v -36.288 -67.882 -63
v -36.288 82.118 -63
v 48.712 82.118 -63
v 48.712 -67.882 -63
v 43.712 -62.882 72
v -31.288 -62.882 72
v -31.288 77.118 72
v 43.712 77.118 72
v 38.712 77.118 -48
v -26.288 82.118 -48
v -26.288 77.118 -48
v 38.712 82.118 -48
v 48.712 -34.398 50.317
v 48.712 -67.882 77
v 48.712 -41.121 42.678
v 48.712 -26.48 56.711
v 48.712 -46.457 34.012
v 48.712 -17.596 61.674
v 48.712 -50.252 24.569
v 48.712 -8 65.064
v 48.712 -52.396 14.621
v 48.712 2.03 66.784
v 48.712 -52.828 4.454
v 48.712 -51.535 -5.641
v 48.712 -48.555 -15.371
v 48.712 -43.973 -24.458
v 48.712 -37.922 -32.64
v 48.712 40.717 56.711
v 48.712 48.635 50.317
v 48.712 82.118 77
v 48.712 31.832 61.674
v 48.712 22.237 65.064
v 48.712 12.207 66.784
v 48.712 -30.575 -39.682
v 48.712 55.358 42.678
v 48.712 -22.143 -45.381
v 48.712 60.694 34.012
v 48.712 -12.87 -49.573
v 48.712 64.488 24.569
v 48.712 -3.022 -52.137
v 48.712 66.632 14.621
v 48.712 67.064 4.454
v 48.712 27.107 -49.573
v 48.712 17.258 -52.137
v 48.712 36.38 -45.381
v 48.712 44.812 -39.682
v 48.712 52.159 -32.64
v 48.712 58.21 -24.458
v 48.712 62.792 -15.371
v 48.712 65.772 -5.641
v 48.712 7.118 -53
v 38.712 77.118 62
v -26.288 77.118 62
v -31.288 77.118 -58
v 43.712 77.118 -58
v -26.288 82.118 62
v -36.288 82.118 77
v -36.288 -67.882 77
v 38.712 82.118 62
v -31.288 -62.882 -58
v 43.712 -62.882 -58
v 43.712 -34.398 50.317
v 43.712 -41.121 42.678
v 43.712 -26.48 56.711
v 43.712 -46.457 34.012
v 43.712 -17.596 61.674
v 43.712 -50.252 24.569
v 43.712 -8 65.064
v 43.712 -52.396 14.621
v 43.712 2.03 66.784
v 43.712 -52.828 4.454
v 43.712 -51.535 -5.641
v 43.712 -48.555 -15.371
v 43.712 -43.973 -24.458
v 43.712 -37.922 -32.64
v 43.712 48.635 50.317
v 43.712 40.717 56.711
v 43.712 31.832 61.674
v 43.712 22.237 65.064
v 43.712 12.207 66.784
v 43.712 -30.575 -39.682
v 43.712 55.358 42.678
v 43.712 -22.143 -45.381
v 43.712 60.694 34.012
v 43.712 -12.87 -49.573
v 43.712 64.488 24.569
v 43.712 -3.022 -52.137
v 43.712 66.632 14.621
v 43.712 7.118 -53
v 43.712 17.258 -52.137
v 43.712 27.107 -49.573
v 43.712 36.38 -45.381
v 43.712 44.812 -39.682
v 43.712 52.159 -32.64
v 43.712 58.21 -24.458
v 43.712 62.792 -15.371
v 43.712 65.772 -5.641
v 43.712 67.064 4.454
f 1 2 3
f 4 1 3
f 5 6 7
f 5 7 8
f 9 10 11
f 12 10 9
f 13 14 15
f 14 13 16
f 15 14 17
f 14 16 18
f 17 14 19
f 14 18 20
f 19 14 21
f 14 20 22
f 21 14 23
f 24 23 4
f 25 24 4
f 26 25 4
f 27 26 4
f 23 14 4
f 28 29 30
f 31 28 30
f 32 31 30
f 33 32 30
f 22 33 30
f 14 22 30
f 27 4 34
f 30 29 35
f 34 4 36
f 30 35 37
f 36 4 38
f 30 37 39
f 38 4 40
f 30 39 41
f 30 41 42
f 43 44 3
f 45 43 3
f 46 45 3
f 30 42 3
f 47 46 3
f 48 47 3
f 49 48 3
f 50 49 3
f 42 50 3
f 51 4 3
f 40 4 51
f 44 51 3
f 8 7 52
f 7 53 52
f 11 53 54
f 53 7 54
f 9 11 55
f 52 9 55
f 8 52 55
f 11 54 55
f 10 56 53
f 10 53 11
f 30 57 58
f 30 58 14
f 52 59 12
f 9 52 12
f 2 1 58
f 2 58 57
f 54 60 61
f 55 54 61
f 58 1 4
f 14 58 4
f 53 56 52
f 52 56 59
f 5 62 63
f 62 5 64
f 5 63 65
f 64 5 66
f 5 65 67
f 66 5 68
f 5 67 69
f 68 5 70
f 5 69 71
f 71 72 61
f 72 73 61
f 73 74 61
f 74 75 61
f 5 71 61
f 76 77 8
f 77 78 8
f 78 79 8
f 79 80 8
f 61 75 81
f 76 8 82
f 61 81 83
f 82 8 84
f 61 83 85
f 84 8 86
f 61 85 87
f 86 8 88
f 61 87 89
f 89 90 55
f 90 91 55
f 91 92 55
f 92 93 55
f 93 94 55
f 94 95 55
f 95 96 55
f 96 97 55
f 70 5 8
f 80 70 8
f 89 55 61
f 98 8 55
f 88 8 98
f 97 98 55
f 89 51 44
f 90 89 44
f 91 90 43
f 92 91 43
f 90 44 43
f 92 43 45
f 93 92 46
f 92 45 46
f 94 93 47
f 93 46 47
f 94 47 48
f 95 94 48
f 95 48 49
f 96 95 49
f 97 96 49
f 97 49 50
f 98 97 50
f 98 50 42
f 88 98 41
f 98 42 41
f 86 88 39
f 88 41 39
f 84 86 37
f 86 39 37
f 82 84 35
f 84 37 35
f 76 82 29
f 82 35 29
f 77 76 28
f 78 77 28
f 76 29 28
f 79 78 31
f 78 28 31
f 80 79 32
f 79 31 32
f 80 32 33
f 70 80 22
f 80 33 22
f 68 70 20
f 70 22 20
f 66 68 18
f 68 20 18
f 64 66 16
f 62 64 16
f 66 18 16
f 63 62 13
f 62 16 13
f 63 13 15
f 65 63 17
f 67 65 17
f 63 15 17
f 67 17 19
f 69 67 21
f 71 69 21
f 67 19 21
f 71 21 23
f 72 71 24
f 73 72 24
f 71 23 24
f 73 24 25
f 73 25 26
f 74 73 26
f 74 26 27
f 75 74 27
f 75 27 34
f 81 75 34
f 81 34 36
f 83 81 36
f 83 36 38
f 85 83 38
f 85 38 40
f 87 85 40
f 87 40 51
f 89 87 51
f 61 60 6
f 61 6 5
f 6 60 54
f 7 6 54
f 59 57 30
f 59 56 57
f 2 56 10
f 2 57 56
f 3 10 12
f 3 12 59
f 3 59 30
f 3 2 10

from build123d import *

# Parameters (mm, degrees)
SKETCH1_W           = 8.5
SKETCH1_H           = 15
BOSS_EXTRUDE1_DEPTH = 14
SHELL3_T            = -0.5
SKETCH2_W           = 14
SKETCH2_H           = 15
SKETCH2_R           = 6
BOSS_EXTRUDE2_DEPTH = 0.5
SKETCH3_W           = 6.5
SKETCH3_H           = 11
CUT_EXTRUDE1_DEPTH  = 0.5
SCALE1_SCALE        = 10


with BuildPart() as part:
    # Sketch1 → Boss-Extrude1 (new body)
    with BuildSketch(Plane.XY):
        Rectangle(SKETCH1_W, SKETCH1_H)
    extrude(amount=BOSS_EXTRUDE1_DEPTH)

    # Shell3
    shell3_openings = [part.faces().sort_by_distance(p)[0] for p in [
        (4.25, 0, 7),
    ]]
    offset(amount=SHELL3_T, openings=shell3_openings, kind=Kind.INTERSECTION)

    # Sketch2 → Boss-Extrude2 (add)
    with BuildSketch(Plane(origin=(4.25, 0, 0), x_dir=(0, 0, -1), z_dir=(1, 0, 0))):
        with Locations((-7, 0)):
            Rectangle(SKETCH2_W, SKETCH2_H)
        with Locations((-7, 0)):
            Circle(SKETCH2_R, mode=Mode.SUBTRACT)
    extrude(amount=-BOSS_EXTRUDE2_DEPTH)

    # Sketch3 → Cut-Extrude1 (cut)
    with BuildSketch(Plane(origin=(0, 7.5, 0), x_dir=(1, 0, 0), z_dir=(0, 1, 0))):
        with Locations((0, -7)):
            Rectangle(SKETCH3_W, SKETCH3_H)
    extrude(amount=-CUT_EXTRUDE1_DEPTH, mode=Mode.SUBTRACT)


with BuildPart() as part_1:
    # Scale1: scaled about (-0.690246419, -0.790925988, 7)
    add(part.part.scale(SCALE1_SCALE).moved(Location((6.212217771, 7.118333892, -63))))


solid = part_1.part
